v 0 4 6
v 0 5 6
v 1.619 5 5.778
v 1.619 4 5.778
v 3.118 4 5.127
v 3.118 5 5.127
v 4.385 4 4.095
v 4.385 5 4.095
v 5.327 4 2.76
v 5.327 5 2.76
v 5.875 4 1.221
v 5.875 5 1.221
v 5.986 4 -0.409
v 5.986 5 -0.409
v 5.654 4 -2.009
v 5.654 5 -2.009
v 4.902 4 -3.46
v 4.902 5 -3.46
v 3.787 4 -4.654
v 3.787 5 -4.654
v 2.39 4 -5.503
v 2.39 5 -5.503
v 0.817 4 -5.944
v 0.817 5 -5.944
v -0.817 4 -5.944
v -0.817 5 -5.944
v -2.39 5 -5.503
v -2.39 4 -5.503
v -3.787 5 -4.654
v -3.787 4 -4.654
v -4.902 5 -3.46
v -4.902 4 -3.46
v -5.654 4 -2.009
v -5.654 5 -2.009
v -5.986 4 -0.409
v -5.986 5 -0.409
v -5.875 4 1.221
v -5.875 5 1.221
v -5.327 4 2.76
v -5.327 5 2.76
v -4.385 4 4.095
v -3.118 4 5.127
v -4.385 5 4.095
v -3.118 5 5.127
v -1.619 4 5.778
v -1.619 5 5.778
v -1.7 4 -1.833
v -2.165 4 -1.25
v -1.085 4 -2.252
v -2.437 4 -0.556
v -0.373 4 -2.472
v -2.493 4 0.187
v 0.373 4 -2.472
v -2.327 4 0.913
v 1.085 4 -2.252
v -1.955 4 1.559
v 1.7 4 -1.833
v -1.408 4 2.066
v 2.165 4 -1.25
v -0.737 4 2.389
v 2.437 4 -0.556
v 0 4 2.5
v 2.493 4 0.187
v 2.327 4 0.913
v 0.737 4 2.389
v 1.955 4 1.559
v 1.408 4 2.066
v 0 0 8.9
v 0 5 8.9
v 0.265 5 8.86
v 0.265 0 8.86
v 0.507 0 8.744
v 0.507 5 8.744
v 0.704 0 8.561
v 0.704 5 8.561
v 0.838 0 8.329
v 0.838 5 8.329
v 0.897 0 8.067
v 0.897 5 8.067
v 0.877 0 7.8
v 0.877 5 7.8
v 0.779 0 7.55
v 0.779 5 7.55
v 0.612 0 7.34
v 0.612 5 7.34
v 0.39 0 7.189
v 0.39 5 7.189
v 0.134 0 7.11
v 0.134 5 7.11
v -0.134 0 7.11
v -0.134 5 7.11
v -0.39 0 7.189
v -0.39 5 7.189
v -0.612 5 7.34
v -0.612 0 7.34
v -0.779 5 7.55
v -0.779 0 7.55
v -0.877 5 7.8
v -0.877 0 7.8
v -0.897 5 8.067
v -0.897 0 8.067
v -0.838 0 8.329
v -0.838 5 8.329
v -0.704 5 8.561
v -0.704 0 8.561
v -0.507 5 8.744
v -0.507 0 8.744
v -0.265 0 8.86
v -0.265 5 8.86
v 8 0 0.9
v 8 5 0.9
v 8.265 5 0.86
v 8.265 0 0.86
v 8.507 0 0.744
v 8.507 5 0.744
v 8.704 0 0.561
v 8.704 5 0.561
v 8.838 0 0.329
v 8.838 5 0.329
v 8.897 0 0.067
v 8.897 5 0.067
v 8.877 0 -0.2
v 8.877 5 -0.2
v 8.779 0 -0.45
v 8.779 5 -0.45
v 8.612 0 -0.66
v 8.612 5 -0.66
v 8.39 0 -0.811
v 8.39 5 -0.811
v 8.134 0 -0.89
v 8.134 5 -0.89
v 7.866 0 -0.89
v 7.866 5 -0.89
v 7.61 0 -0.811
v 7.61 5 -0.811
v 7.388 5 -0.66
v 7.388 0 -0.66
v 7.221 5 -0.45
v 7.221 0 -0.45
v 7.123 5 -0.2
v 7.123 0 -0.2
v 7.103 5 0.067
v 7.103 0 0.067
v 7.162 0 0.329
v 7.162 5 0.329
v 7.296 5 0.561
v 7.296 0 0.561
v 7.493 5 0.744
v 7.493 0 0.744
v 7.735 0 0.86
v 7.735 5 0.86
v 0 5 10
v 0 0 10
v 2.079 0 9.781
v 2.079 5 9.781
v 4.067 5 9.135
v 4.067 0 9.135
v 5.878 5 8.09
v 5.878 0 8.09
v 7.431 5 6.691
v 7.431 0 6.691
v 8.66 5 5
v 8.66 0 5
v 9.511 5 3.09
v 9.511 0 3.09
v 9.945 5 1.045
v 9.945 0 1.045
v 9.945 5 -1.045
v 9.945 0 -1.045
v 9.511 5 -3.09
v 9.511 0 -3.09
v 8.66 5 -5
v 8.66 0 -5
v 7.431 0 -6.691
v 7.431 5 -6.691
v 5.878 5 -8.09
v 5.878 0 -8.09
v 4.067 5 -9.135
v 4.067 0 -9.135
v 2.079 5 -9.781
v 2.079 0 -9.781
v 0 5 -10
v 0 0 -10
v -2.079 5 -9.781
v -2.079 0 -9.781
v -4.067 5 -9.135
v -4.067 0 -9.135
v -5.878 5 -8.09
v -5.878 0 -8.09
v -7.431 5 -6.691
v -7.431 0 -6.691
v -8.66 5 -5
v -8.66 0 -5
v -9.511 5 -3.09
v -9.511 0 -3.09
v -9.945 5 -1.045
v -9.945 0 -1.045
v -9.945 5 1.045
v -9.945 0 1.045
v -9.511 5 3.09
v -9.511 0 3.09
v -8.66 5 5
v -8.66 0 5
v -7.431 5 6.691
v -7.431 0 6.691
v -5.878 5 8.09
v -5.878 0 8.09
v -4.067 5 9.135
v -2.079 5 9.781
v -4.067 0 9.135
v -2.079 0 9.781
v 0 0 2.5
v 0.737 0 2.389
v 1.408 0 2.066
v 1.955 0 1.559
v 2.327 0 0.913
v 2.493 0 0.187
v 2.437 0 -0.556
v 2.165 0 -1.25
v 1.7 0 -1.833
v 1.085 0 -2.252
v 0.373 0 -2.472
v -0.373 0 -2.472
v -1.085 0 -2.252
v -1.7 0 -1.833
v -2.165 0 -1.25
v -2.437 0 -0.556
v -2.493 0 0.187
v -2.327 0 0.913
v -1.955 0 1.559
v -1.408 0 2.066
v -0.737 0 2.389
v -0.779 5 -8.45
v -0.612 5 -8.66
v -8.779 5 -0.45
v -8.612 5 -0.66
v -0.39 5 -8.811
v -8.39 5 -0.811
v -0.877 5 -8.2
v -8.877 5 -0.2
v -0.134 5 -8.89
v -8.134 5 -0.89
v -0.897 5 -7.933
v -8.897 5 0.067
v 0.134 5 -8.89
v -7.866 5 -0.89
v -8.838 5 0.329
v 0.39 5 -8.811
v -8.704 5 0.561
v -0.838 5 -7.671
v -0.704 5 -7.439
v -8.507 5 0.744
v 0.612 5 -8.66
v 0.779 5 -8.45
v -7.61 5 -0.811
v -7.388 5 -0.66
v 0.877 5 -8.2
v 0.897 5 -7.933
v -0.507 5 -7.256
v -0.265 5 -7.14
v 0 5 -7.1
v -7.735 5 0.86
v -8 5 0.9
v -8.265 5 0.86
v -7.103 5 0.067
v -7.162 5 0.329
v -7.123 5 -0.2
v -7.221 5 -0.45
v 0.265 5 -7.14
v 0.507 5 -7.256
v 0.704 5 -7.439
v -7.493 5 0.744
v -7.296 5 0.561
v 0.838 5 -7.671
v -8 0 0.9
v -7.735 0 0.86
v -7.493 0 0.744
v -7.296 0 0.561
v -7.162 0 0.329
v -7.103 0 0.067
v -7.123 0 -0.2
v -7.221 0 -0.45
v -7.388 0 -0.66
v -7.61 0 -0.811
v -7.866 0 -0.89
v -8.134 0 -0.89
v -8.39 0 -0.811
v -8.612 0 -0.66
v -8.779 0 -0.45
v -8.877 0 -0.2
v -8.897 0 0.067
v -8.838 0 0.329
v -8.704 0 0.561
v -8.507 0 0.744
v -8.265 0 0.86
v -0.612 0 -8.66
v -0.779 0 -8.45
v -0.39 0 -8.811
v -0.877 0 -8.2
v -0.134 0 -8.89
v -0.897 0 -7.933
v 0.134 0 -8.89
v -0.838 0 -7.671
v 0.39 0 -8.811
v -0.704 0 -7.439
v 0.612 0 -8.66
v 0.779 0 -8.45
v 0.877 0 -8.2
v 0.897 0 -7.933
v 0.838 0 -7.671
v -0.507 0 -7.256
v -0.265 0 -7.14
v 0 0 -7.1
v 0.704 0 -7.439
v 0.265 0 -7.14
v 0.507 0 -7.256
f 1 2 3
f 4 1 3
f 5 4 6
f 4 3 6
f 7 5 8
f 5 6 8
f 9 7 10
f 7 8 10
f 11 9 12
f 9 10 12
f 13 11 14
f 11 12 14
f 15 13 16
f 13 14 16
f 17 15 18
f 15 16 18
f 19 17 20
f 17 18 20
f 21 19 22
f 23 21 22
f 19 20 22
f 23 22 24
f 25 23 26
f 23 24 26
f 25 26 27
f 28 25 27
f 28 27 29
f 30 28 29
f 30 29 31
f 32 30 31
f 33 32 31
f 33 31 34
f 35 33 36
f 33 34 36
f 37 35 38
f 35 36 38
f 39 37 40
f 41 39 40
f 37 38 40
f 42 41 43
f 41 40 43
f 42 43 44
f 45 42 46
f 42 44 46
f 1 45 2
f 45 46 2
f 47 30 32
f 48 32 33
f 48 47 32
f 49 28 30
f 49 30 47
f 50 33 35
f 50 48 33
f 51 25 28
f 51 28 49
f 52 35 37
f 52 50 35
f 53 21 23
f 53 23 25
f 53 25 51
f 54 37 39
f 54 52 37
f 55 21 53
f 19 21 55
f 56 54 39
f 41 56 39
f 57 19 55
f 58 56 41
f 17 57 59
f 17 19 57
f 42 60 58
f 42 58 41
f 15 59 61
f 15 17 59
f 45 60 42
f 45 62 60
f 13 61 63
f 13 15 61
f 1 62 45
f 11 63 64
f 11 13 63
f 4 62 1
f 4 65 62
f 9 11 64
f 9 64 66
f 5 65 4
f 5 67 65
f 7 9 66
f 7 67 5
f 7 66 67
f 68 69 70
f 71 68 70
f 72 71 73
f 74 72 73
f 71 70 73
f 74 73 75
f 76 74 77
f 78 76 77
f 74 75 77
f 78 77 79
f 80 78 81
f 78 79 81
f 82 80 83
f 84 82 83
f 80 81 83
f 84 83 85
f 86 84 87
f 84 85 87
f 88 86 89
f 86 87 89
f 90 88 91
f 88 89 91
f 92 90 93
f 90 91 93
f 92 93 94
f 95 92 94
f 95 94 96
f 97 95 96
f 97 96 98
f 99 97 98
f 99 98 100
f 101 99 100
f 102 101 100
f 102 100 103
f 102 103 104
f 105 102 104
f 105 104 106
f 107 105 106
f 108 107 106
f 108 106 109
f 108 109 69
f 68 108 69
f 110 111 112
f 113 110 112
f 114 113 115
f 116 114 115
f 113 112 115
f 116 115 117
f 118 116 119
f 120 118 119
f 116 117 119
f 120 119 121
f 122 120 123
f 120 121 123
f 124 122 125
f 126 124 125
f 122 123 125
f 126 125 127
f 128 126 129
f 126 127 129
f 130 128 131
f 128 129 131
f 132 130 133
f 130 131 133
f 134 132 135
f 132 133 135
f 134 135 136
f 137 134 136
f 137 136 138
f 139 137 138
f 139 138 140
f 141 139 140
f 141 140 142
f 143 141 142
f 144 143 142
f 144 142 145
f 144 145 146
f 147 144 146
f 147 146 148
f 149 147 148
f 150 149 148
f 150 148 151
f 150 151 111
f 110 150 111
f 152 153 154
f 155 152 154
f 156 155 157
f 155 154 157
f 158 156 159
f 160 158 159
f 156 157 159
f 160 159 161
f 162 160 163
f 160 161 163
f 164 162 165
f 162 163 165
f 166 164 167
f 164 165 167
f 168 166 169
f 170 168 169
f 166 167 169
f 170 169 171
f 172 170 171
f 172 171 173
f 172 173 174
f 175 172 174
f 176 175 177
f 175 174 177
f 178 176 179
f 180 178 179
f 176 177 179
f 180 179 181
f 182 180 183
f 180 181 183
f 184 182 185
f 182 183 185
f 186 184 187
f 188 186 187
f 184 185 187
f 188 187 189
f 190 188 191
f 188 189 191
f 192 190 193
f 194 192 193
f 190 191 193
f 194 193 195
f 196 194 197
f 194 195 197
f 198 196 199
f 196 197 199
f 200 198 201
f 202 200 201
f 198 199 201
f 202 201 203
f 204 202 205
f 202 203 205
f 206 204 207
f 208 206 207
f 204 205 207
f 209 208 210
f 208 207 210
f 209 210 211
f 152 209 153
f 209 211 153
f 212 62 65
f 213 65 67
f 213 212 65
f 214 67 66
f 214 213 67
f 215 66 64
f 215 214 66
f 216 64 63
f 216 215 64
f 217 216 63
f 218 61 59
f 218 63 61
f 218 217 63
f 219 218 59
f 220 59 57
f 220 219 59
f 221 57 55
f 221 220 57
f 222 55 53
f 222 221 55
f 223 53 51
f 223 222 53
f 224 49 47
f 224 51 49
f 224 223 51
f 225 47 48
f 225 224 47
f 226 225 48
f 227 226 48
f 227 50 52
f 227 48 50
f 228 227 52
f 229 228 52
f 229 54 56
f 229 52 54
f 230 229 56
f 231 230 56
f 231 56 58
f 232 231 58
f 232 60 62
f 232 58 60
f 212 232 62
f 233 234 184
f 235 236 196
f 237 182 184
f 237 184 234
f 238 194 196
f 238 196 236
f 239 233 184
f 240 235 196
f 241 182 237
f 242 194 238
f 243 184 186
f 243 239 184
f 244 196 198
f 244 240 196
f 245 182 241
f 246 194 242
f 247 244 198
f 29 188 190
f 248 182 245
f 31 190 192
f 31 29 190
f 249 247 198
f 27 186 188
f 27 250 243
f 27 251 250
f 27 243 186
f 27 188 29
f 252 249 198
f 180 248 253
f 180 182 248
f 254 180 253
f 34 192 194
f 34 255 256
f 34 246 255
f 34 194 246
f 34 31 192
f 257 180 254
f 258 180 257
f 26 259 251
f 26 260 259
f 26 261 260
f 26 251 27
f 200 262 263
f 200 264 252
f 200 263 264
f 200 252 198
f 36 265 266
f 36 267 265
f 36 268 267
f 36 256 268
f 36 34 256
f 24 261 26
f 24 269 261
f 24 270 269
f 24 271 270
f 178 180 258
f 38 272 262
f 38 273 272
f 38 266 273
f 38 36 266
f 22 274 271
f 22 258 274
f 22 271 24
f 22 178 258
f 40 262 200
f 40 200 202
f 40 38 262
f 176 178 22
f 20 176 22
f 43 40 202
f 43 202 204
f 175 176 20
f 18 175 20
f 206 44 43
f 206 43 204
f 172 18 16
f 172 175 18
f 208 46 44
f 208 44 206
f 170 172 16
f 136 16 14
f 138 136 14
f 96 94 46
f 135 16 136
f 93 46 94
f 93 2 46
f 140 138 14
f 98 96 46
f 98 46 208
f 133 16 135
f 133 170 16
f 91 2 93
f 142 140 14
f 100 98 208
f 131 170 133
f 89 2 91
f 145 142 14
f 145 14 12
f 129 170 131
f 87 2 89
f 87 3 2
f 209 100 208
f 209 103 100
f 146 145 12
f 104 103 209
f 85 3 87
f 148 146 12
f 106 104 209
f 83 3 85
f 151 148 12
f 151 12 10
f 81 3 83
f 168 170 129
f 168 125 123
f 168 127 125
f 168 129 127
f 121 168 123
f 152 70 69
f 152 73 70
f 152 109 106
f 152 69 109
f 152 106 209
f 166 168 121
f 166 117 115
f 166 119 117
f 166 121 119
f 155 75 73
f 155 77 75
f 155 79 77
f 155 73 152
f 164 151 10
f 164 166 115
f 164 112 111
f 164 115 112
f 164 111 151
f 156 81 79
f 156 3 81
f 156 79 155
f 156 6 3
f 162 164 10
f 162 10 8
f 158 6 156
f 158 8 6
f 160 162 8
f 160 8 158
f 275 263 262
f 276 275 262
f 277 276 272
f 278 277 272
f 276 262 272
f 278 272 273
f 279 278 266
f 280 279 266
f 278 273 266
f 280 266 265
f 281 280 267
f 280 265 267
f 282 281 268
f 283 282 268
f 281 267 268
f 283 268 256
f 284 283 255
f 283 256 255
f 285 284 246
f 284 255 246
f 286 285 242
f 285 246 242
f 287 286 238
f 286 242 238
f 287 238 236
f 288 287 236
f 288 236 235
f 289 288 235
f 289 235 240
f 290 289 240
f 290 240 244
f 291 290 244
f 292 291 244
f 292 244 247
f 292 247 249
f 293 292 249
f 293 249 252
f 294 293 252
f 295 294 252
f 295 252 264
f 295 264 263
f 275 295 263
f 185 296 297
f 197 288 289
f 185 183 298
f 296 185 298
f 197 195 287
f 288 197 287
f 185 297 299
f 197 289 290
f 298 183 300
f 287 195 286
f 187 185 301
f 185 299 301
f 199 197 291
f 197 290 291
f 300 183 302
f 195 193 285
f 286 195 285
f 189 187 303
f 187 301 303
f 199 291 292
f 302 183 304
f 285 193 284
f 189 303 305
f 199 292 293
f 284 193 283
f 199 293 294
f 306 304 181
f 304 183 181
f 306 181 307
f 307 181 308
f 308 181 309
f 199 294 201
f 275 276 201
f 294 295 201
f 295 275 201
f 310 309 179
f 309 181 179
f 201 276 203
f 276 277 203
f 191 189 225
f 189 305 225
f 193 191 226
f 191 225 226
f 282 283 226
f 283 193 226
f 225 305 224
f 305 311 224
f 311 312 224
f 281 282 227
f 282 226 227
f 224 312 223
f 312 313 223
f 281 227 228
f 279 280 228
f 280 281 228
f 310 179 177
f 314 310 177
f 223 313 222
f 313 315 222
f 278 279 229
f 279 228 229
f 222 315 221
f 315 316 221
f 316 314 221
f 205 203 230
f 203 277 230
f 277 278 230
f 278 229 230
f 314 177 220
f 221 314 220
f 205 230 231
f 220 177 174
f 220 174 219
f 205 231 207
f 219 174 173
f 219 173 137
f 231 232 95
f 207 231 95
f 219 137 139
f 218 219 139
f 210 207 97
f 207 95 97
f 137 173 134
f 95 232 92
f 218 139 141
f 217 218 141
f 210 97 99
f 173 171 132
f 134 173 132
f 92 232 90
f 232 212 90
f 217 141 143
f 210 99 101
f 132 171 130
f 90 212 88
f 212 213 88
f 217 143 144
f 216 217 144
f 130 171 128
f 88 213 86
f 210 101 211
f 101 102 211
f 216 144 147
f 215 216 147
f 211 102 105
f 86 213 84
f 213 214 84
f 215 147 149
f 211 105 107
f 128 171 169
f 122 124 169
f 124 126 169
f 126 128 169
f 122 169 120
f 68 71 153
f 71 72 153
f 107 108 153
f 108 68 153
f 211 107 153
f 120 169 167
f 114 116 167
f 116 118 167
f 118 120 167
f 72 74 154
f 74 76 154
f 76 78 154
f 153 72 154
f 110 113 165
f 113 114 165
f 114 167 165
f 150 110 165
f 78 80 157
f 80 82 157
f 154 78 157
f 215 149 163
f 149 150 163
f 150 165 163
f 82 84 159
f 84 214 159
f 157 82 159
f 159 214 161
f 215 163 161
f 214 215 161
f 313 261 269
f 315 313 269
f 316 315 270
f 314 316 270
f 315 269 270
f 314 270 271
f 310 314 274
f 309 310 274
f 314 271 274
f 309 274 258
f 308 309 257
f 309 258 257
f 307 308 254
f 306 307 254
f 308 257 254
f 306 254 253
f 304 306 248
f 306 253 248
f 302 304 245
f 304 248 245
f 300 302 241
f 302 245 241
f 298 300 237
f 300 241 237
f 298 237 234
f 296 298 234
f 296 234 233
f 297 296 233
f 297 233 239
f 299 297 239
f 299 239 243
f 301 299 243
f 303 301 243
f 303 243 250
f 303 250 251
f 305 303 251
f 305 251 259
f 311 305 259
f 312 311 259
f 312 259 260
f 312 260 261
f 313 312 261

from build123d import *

# Parameters (mm, degrees)
SKETCH_1_R          = 10
SKETCH_1_R_2        = 2.5
EXTRUDE_1_DEPTH     = 5
SKETCH_2_R          = 6
CUT_EXTRUDE_1_DEPTH = 1
SKETCH_3_R          = 0.9
CUT_EXTRUDE_2_DEPTH = 16


with BuildPart() as part:
    # 草图1 → 凸台-拉伸1 (new body)
    with BuildSketch(Plane(origin=(0, 0, 0), x_dir=(1, 0, 0), z_dir=(0, 1, 0))):
        with Locations(Location((0, 0, 0), (0, 0, 270))):
            Circle(SKETCH_1_R)
        with Locations(Location((0, 0, 0), (0, 0, 270))):
            Circle(SKETCH_1_R_2, mode=Mode.SUBTRACT)
    extrude(amount=EXTRUDE_1_DEPTH)

    # 草图2 → 切除-拉伸1 (cut)
    with BuildSketch(Plane(origin=(0, 5, 0), x_dir=(1, 0, 0), z_dir=(0, 1, 0))):
        with Locations(Location((0, 0, 0), (0, 0, 270))):
            Circle(SKETCH_2_R)
    extrude(amount=-CUT_EXTRUDE_1_DEPTH, mode=Mode.SUBTRACT)

    # 草图3 → 切除-拉伸2 (cut, through all)
    with BuildSketch(Plane(origin=(0, 5, 0), x_dir=(1, 0, 0), z_dir=(0, 1, 0))):
        with Locations(Location((0, 8, 0), (0, 0, 270))):
            Circle(SKETCH_3_R)
        with Locations(Location((8, 0, 0), (0, 0, 270))):
            Circle(SKETCH_3_R)
        with Locations(Location((0, -8, 0), (0, 0, 270))):
            Circle(SKETCH_3_R)
        with Locations(Location((-8, 0, 0), (0, 0, 270))):
            Circle(SKETCH_3_R)
    extrude(amount=-CUT_EXTRUDE_2_DEPTH, mode=Mode.SUBTRACT)


solid = part.part
